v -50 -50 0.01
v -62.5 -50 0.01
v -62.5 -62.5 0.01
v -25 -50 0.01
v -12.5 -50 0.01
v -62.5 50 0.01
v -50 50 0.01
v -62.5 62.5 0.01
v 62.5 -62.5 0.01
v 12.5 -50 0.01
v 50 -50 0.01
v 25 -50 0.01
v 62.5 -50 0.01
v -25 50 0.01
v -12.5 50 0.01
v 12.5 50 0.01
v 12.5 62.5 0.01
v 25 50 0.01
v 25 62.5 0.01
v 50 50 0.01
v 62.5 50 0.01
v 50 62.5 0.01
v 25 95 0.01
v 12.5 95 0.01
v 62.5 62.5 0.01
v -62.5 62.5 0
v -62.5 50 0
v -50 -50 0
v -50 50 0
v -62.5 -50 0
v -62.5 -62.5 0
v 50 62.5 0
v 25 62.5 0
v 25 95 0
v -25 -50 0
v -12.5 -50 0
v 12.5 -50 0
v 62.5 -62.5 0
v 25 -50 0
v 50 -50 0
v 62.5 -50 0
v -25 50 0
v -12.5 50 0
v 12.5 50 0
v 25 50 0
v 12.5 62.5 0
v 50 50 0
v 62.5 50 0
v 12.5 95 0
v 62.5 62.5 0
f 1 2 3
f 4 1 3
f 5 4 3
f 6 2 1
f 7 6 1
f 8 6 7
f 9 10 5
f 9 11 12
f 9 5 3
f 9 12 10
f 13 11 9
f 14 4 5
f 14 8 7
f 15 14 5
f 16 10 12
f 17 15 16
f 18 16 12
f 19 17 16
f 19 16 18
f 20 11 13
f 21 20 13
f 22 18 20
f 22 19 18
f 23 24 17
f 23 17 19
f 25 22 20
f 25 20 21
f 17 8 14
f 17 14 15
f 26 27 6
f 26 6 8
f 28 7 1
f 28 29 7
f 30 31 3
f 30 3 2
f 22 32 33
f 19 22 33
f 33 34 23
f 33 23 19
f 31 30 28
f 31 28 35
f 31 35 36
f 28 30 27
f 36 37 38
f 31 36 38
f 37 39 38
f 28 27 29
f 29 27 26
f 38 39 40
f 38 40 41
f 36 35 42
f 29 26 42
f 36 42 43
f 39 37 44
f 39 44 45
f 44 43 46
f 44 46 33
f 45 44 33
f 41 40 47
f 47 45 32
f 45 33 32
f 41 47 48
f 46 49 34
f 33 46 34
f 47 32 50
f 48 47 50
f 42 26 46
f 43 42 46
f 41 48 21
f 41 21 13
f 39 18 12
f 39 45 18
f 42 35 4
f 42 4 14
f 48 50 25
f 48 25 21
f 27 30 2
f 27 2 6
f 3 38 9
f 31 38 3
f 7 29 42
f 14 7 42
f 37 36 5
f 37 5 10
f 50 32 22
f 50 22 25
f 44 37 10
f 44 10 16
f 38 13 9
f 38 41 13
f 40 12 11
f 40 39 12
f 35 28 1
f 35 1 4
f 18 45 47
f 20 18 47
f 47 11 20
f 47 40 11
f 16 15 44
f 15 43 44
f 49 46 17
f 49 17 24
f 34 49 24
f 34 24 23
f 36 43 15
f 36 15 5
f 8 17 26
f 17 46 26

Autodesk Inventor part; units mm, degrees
ref_plane "YZ Plane" through (0, 0, 0) normal (1, 0, 0) x (0, 1, 0)
ref_plane "XZ Plane" through (0, 0, 0) normal (0, 1, 0) x (-1, 0, 0)
ref_plane "XY Plane" through (0, 0, 0) normal (0, 0, 1) x (1, 0, 0)
sketch "Sketch1" plane through (0, 0, 0) normal (0, 0, 1) x (1, 0, 0)
  line L0 (62.5, -62.5) -> (-62.5, -62.5)
  line L1 (50, -50) -> (50, 50)
  line L2 (50, 62.5) -> (62.5, 62.5)
  line L3 (62.5, 62.5) -> (62.5, -62.5)
  line L4 (75, -75) -> (-75, -75) construction
  line L5 (-75, -75) -> (-75, 75) construction
  line L6 (-75, 75) -> (75, 75) construction
  line L7 (75, 75) -> (75, -75) construction
  line L8 (0, -75) -> (0, 75) construction
  line L9 (75, 0) -> (-75, 0) construction
  line L10 (12.5, -50) -> (12.5, 50)
  line L11 (25, 50) -> (25, -50)
  line L12 (-25, -50) -> (-25, 50)
  line L13 (-12.5, 50) -> (-12.5, -50)
  line L14 (-62.5, -62.5) -> (-62.5, 62.5)
  line L15 (-50, 50) -> (-50, -50)
  line L16 (-62.5, -62.5) -> (-62.5, -50)
  line L17 (62.5, -50) -> (62.5, -62.5)
  line L18 (-62.5, 62.5) -> (-62.5, 50)
  line L19 (62.5, 50) -> (62.5, 62.5)
  line L20 (25, -50) -> (50, -50)
  line L21 (-50, -50) -> (-25, -50)
  line L22 (-12.5, -50) -> (12.5, -50)
  line L23 (25, 50) -> (50, 50)
  line L24 (-50, 50) -> (-25, 50)
  line L25 (-12.5, 50) -> (12.5, 50)
  line L26 (12.5, 62.5) -> (12.5, 95)
  line L27 (12.5, 95) -> (25, 95)
  line L28 (25, 95) -> (25, 62.5)
  line L29 (62.5, 62.5) -> (25, 62.5)
  line L30 (12.5, 62.5) -> (-62.5, 62.5)
  point P0 (0, 0)
  dimension "d1" = 125
  dimension "d2" = 150
  dimension "d3" = 25
  dimension "d4" = 25
  dimension "d5" = 25
  dimension "d8" = 12.5
  dimension "d9" = 12.5
  dimension "d10" = 12.5
  dimension "d11" = 12.5
  dimension "d13" = 12.5
  dimension "d14" = 12.5
  dimension "d15" = 20
extrude "Extrusion1" add sketch "Sketch1" along normal blind 0.01
properties part number "Square_Copper" material "Copper"
